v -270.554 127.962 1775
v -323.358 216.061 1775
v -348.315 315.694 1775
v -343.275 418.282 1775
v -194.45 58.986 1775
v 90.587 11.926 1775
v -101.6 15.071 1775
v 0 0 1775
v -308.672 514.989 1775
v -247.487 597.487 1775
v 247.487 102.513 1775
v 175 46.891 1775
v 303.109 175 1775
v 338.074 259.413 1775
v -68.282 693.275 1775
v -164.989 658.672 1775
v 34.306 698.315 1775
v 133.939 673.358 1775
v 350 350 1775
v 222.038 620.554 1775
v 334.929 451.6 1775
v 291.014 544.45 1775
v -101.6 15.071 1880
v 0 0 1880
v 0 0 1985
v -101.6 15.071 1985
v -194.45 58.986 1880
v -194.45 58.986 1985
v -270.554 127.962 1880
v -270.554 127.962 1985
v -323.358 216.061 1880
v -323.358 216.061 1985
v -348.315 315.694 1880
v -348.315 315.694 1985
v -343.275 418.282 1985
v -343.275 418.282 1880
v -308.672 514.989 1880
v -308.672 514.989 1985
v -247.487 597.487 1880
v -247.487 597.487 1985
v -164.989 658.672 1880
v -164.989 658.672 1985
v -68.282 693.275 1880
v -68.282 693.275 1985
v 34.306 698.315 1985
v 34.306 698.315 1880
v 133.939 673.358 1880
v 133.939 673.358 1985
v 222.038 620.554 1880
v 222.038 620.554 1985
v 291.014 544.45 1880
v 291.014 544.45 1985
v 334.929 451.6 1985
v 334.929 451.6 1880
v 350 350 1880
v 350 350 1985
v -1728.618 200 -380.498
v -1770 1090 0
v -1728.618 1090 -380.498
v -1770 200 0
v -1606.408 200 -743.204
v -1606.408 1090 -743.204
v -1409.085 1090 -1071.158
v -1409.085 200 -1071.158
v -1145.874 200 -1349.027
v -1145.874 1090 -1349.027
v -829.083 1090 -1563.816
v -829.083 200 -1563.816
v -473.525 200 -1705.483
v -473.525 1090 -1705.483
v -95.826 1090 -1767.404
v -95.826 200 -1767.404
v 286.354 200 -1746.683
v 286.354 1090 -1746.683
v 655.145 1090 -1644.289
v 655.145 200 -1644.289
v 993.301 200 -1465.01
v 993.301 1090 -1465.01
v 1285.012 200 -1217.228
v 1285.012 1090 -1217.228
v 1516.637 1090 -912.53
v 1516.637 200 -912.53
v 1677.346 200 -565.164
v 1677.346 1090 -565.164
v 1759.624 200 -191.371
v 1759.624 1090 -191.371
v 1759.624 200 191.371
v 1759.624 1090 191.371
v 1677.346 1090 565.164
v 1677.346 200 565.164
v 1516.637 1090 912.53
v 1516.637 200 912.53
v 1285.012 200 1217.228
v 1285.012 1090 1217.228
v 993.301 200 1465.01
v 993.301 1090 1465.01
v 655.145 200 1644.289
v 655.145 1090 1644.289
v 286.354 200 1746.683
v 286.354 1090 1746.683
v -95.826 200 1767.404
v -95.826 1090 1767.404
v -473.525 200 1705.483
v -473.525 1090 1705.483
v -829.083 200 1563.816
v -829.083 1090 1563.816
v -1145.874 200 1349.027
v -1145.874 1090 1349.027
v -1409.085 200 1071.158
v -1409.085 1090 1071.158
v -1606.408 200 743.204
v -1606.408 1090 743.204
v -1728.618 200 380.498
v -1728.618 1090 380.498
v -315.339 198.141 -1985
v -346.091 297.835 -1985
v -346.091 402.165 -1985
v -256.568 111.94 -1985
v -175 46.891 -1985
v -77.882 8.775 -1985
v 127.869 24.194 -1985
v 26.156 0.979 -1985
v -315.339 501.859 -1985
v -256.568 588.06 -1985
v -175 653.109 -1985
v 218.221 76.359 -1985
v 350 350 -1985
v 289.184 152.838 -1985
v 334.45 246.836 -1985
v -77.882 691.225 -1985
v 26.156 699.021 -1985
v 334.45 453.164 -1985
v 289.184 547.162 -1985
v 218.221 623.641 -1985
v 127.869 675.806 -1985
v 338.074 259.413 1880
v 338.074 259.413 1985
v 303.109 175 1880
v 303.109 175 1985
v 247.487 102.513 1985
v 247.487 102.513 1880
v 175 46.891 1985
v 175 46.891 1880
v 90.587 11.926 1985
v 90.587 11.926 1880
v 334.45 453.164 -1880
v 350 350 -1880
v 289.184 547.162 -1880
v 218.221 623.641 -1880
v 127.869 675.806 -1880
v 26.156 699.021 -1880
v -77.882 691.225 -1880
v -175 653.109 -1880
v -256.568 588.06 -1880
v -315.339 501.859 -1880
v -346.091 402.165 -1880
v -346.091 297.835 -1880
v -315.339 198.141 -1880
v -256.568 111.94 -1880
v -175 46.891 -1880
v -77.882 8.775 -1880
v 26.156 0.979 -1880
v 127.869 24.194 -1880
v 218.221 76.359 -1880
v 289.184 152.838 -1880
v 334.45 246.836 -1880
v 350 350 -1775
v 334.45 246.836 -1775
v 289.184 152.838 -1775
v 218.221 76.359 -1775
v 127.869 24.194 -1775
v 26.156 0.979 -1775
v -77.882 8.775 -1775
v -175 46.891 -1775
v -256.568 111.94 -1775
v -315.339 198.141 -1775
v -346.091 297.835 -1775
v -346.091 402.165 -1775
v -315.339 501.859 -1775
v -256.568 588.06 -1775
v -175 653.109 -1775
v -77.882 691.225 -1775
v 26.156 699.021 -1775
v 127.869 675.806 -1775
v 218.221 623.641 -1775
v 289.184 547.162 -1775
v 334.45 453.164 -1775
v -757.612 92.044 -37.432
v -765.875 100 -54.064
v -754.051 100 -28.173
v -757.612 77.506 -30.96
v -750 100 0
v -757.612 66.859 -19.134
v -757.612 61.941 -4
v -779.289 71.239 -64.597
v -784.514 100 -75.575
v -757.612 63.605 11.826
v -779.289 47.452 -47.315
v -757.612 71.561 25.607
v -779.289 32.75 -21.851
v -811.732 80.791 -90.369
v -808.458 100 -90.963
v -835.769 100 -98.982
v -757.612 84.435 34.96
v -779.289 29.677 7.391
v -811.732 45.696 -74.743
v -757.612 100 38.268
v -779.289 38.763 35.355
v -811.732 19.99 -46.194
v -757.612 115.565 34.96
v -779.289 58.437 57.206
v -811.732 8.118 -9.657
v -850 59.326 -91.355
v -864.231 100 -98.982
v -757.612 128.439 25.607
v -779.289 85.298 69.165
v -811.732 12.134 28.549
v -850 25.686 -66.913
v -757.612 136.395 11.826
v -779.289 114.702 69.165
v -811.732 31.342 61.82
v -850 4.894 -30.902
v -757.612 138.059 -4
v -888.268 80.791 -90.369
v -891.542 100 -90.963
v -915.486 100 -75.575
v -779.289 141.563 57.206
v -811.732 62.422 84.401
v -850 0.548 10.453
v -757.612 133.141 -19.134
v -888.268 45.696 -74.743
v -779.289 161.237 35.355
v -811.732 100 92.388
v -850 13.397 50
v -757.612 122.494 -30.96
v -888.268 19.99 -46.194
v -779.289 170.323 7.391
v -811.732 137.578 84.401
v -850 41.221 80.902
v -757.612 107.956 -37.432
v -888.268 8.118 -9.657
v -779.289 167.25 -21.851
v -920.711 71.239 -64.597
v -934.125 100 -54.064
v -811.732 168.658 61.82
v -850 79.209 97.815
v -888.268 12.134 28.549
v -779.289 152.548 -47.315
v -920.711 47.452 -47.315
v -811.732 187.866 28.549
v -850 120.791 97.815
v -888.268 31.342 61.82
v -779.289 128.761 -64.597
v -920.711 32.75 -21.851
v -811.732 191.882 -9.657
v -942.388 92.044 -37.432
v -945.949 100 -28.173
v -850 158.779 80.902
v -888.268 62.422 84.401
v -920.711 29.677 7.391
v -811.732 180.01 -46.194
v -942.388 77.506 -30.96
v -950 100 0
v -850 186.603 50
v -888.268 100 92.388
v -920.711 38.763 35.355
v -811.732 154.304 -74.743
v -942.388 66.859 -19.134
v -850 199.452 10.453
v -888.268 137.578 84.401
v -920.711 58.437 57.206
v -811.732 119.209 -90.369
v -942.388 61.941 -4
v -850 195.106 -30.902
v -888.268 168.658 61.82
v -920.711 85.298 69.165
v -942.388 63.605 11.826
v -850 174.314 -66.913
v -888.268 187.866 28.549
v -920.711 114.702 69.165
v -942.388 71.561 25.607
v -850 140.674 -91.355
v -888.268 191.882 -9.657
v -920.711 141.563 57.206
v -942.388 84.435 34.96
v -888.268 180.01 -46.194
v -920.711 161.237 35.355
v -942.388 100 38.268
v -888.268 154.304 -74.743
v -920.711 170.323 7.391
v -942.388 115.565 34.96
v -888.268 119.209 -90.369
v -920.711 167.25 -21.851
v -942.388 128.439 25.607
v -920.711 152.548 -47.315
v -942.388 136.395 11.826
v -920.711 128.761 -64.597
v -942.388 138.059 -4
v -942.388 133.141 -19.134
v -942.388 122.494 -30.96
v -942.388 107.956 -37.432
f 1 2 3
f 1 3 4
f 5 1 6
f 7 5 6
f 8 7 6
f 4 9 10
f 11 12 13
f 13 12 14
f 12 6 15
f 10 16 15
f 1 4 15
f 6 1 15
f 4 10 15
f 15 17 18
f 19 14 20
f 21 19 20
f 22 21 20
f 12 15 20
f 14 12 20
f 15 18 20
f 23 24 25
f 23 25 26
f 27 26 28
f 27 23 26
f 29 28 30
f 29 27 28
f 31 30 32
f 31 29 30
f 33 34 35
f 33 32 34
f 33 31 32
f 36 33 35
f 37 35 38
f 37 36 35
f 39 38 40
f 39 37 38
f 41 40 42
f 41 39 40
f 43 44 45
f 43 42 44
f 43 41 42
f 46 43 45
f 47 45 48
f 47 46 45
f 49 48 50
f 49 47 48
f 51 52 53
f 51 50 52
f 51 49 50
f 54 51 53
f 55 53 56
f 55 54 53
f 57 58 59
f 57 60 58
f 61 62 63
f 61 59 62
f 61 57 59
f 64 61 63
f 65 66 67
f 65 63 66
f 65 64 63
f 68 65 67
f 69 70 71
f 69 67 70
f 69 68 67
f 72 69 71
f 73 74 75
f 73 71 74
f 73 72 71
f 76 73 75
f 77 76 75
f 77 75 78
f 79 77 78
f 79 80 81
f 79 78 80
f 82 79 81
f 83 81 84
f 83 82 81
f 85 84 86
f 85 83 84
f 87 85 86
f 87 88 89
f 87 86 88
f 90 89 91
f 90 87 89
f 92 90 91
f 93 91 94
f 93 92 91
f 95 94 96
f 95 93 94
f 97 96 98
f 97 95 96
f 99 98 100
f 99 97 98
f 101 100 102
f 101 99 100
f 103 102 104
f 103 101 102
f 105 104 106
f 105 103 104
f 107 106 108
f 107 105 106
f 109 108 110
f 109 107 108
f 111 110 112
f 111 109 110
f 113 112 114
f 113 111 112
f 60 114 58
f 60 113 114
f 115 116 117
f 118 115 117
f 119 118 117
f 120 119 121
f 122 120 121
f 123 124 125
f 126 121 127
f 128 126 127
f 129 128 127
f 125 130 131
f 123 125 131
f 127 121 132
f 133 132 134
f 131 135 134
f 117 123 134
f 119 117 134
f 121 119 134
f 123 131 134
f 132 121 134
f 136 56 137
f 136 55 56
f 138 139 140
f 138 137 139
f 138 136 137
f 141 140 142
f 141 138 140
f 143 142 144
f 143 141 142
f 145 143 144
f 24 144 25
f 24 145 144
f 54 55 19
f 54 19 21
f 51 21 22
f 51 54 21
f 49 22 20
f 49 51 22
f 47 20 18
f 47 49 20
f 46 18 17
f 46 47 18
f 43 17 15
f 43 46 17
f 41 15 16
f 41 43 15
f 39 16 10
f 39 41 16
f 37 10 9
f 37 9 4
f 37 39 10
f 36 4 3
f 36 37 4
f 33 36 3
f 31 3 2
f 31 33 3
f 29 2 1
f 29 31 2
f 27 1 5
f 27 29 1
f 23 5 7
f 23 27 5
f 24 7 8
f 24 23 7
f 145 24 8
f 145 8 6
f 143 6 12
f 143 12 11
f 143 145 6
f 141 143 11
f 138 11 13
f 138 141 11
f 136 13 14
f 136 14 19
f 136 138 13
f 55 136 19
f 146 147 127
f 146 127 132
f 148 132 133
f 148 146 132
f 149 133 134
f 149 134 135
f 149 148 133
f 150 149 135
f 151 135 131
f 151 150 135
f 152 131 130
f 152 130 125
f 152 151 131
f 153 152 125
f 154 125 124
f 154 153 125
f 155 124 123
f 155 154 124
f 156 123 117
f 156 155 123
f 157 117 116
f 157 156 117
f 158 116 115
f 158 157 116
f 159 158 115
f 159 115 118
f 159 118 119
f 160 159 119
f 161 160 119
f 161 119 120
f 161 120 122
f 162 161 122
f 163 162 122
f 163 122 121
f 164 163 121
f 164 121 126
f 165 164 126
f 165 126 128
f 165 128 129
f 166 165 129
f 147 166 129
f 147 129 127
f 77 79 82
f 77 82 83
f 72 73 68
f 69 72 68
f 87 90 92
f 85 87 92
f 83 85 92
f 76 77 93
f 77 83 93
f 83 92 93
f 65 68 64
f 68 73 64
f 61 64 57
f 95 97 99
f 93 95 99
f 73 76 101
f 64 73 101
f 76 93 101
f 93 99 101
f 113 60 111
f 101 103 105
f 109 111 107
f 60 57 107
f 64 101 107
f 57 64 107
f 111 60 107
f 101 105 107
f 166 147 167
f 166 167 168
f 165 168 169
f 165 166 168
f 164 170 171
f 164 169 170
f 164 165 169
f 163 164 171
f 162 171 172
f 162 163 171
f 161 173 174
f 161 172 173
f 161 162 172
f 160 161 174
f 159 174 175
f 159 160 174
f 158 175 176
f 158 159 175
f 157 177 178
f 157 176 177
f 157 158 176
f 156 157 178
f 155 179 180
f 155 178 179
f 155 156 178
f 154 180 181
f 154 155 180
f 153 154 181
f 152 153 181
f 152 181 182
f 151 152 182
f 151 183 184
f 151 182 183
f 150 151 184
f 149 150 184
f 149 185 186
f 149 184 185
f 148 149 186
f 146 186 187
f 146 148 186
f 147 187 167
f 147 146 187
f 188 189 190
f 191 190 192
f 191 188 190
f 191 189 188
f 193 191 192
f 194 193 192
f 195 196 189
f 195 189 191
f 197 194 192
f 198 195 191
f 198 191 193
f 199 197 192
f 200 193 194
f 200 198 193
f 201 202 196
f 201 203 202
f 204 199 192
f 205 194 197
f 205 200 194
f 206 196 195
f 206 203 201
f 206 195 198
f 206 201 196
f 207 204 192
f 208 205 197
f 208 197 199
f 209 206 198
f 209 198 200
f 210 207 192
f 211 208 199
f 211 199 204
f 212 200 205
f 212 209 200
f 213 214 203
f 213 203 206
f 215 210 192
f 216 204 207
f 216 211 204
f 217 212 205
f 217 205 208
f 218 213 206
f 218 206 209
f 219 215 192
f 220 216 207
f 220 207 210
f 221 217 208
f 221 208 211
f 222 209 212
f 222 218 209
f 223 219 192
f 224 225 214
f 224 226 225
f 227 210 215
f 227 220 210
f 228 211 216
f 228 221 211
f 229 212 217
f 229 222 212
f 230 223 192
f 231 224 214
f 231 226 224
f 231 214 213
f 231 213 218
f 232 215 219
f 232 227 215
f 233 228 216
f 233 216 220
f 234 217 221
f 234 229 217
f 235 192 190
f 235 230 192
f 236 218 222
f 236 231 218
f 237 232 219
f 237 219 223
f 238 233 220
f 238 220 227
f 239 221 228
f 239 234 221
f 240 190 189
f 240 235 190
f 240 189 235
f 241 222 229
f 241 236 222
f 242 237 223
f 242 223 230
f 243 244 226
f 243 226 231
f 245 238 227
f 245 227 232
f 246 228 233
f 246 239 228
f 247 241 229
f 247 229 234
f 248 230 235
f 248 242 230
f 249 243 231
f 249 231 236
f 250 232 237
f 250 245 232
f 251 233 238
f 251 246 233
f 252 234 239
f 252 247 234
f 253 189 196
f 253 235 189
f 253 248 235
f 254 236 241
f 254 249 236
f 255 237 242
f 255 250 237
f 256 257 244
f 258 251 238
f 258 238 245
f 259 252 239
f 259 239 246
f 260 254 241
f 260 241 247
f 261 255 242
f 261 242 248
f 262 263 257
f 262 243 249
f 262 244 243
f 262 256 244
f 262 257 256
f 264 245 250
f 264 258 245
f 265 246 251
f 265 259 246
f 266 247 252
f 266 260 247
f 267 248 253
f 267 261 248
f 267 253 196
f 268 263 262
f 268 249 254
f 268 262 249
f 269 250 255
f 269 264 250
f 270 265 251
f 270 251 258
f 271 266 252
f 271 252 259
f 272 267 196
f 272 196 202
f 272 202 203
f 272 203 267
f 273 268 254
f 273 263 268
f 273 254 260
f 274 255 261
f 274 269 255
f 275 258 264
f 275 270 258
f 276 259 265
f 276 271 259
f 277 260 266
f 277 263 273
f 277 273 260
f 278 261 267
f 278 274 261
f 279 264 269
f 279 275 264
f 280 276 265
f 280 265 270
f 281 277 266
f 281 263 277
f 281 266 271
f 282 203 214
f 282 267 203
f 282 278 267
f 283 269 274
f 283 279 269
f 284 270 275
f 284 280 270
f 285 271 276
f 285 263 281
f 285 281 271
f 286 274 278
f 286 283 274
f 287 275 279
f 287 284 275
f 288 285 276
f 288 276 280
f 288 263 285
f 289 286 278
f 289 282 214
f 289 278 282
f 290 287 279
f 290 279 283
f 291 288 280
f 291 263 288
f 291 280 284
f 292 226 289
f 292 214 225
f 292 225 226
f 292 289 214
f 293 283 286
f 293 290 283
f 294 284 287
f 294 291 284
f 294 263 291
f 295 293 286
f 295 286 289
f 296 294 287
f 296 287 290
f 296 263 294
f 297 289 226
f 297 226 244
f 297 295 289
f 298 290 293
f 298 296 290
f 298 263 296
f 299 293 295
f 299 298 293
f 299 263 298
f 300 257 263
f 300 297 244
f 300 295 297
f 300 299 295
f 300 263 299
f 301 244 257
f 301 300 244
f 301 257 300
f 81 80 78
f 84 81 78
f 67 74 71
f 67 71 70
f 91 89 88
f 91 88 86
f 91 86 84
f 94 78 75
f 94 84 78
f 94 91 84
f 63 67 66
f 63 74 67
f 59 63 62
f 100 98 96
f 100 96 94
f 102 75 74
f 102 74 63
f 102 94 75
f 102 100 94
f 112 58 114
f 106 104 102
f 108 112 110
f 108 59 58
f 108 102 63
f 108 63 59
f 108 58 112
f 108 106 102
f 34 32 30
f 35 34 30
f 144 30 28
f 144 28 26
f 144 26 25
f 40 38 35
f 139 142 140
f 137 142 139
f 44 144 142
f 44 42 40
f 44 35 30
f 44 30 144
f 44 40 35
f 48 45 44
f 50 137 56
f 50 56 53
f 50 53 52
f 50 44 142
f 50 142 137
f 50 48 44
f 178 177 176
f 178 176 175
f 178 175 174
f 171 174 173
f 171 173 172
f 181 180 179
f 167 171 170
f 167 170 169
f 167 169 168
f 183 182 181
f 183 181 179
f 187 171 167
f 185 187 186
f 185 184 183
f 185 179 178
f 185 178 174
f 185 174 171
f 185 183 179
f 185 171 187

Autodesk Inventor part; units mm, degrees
sketch "Sketch1" plane through (0, 0, 0) normal (0, 1, 0) x (-1, 0, 0)
  circle A0 centre (0, 0) radius 1770
  line L0 (-350, -1985) -> (350, -1985)
  line L1 (350, -1985) -> (350, -1775)
  line L2 (350, -1775) -> (-350, -1775)
  line L3 (-350, -1775) -> (-350, -1985)
  line L4 (-350, -1985) -> (350, -1775) construction
  line L5 (350, -1985) -> (-350, -1775) construction
  line L6 (-350, 1985) -> (350, 1985)
  line L7 (350, 1985) -> (350, 1775)
  line L8 (350, 1775) -> (-350, 1775)
  line L9 (-350, 1775) -> (-350, 1985)
  line L10 (-350, 1985) -> (350, 1775) construction
  line L11 (350, 1985) -> (-350, 1775) construction
  circle A1 centre (850, 0) radius 100
  point P0 (0, -1880)
  point P1 (0, 1880)
  dimension "d0" = 3540
  dimension "d1" = 700
  dimension "d2" = 210
  dimension "d3" = 700
  dimension "d4" = 210
  dimension "d5" = 200
ref_plane "Work Plane1" through (0, 200, 0) normal (0, 1, 0) x (-1, 0, 0)
ref_plane "Work Plane2" through (0, 0, 1880) normal (0, 0, 1) x (1, 0, 0)
ref_plane "Work Plane3" through (0, 0, -1880) normal (0, 0, 1) x (1, 0, 0)
ref_plane "Work Plane4" through (0, 100, 0) normal (0, 1, 0) x (-1, 0, 0)
sketch "Sketch2" plane through (0, 200, 0) normal (0, 1, 0) x (-1, 0, 0)
  circle A0 centre (0, 0) radius 1770 projected
extrude "Extrusion1" add sketch "Sketch2" along normal blind 890
sketch "Sketch3" plane through (0, 0, 1880) normal (0, 0, 1) x (1, 0, 0)
  line L0 (350, 0) -> (-350, 0) projected
  circle A0 centre (0, 350) radius 350
  point P0 (0, 0)
  dimension "d12" = 700
extrude "Extrusion2" add sketch "Sketch3" along normal mid plane 210
sketch "Sketch4" plane through (0, 0, -1880) normal (0, 0, 1) x (1, 0, 0)
  circle A0 centre (0, 350) radius 350
  point P0 (0, 0)
  dimension "d15" = 700
extrude "Extrusion3" add sketch "Sketch4" along normal mid plane 210
sketch "Sketch5" plane through (0, 100, 0) normal (0, 1, 0) x (-1, 0, 0)
  circle A0 centre (850, 0) radius 100 projected
  circle A1 centre (850, 0) radius 100
  line L0 (950, 0) -> (750, 0)
  point P0 (0, 0)
  dimension "d18" = 200
revolve "Revolution1" add sketch "Sketch5" angle 360 about axis through (-950, 100, 0) along (1, 0, 0) picked at (872.7518, -42.3477) contours A0 L0
properties part number "KobukiV3"
